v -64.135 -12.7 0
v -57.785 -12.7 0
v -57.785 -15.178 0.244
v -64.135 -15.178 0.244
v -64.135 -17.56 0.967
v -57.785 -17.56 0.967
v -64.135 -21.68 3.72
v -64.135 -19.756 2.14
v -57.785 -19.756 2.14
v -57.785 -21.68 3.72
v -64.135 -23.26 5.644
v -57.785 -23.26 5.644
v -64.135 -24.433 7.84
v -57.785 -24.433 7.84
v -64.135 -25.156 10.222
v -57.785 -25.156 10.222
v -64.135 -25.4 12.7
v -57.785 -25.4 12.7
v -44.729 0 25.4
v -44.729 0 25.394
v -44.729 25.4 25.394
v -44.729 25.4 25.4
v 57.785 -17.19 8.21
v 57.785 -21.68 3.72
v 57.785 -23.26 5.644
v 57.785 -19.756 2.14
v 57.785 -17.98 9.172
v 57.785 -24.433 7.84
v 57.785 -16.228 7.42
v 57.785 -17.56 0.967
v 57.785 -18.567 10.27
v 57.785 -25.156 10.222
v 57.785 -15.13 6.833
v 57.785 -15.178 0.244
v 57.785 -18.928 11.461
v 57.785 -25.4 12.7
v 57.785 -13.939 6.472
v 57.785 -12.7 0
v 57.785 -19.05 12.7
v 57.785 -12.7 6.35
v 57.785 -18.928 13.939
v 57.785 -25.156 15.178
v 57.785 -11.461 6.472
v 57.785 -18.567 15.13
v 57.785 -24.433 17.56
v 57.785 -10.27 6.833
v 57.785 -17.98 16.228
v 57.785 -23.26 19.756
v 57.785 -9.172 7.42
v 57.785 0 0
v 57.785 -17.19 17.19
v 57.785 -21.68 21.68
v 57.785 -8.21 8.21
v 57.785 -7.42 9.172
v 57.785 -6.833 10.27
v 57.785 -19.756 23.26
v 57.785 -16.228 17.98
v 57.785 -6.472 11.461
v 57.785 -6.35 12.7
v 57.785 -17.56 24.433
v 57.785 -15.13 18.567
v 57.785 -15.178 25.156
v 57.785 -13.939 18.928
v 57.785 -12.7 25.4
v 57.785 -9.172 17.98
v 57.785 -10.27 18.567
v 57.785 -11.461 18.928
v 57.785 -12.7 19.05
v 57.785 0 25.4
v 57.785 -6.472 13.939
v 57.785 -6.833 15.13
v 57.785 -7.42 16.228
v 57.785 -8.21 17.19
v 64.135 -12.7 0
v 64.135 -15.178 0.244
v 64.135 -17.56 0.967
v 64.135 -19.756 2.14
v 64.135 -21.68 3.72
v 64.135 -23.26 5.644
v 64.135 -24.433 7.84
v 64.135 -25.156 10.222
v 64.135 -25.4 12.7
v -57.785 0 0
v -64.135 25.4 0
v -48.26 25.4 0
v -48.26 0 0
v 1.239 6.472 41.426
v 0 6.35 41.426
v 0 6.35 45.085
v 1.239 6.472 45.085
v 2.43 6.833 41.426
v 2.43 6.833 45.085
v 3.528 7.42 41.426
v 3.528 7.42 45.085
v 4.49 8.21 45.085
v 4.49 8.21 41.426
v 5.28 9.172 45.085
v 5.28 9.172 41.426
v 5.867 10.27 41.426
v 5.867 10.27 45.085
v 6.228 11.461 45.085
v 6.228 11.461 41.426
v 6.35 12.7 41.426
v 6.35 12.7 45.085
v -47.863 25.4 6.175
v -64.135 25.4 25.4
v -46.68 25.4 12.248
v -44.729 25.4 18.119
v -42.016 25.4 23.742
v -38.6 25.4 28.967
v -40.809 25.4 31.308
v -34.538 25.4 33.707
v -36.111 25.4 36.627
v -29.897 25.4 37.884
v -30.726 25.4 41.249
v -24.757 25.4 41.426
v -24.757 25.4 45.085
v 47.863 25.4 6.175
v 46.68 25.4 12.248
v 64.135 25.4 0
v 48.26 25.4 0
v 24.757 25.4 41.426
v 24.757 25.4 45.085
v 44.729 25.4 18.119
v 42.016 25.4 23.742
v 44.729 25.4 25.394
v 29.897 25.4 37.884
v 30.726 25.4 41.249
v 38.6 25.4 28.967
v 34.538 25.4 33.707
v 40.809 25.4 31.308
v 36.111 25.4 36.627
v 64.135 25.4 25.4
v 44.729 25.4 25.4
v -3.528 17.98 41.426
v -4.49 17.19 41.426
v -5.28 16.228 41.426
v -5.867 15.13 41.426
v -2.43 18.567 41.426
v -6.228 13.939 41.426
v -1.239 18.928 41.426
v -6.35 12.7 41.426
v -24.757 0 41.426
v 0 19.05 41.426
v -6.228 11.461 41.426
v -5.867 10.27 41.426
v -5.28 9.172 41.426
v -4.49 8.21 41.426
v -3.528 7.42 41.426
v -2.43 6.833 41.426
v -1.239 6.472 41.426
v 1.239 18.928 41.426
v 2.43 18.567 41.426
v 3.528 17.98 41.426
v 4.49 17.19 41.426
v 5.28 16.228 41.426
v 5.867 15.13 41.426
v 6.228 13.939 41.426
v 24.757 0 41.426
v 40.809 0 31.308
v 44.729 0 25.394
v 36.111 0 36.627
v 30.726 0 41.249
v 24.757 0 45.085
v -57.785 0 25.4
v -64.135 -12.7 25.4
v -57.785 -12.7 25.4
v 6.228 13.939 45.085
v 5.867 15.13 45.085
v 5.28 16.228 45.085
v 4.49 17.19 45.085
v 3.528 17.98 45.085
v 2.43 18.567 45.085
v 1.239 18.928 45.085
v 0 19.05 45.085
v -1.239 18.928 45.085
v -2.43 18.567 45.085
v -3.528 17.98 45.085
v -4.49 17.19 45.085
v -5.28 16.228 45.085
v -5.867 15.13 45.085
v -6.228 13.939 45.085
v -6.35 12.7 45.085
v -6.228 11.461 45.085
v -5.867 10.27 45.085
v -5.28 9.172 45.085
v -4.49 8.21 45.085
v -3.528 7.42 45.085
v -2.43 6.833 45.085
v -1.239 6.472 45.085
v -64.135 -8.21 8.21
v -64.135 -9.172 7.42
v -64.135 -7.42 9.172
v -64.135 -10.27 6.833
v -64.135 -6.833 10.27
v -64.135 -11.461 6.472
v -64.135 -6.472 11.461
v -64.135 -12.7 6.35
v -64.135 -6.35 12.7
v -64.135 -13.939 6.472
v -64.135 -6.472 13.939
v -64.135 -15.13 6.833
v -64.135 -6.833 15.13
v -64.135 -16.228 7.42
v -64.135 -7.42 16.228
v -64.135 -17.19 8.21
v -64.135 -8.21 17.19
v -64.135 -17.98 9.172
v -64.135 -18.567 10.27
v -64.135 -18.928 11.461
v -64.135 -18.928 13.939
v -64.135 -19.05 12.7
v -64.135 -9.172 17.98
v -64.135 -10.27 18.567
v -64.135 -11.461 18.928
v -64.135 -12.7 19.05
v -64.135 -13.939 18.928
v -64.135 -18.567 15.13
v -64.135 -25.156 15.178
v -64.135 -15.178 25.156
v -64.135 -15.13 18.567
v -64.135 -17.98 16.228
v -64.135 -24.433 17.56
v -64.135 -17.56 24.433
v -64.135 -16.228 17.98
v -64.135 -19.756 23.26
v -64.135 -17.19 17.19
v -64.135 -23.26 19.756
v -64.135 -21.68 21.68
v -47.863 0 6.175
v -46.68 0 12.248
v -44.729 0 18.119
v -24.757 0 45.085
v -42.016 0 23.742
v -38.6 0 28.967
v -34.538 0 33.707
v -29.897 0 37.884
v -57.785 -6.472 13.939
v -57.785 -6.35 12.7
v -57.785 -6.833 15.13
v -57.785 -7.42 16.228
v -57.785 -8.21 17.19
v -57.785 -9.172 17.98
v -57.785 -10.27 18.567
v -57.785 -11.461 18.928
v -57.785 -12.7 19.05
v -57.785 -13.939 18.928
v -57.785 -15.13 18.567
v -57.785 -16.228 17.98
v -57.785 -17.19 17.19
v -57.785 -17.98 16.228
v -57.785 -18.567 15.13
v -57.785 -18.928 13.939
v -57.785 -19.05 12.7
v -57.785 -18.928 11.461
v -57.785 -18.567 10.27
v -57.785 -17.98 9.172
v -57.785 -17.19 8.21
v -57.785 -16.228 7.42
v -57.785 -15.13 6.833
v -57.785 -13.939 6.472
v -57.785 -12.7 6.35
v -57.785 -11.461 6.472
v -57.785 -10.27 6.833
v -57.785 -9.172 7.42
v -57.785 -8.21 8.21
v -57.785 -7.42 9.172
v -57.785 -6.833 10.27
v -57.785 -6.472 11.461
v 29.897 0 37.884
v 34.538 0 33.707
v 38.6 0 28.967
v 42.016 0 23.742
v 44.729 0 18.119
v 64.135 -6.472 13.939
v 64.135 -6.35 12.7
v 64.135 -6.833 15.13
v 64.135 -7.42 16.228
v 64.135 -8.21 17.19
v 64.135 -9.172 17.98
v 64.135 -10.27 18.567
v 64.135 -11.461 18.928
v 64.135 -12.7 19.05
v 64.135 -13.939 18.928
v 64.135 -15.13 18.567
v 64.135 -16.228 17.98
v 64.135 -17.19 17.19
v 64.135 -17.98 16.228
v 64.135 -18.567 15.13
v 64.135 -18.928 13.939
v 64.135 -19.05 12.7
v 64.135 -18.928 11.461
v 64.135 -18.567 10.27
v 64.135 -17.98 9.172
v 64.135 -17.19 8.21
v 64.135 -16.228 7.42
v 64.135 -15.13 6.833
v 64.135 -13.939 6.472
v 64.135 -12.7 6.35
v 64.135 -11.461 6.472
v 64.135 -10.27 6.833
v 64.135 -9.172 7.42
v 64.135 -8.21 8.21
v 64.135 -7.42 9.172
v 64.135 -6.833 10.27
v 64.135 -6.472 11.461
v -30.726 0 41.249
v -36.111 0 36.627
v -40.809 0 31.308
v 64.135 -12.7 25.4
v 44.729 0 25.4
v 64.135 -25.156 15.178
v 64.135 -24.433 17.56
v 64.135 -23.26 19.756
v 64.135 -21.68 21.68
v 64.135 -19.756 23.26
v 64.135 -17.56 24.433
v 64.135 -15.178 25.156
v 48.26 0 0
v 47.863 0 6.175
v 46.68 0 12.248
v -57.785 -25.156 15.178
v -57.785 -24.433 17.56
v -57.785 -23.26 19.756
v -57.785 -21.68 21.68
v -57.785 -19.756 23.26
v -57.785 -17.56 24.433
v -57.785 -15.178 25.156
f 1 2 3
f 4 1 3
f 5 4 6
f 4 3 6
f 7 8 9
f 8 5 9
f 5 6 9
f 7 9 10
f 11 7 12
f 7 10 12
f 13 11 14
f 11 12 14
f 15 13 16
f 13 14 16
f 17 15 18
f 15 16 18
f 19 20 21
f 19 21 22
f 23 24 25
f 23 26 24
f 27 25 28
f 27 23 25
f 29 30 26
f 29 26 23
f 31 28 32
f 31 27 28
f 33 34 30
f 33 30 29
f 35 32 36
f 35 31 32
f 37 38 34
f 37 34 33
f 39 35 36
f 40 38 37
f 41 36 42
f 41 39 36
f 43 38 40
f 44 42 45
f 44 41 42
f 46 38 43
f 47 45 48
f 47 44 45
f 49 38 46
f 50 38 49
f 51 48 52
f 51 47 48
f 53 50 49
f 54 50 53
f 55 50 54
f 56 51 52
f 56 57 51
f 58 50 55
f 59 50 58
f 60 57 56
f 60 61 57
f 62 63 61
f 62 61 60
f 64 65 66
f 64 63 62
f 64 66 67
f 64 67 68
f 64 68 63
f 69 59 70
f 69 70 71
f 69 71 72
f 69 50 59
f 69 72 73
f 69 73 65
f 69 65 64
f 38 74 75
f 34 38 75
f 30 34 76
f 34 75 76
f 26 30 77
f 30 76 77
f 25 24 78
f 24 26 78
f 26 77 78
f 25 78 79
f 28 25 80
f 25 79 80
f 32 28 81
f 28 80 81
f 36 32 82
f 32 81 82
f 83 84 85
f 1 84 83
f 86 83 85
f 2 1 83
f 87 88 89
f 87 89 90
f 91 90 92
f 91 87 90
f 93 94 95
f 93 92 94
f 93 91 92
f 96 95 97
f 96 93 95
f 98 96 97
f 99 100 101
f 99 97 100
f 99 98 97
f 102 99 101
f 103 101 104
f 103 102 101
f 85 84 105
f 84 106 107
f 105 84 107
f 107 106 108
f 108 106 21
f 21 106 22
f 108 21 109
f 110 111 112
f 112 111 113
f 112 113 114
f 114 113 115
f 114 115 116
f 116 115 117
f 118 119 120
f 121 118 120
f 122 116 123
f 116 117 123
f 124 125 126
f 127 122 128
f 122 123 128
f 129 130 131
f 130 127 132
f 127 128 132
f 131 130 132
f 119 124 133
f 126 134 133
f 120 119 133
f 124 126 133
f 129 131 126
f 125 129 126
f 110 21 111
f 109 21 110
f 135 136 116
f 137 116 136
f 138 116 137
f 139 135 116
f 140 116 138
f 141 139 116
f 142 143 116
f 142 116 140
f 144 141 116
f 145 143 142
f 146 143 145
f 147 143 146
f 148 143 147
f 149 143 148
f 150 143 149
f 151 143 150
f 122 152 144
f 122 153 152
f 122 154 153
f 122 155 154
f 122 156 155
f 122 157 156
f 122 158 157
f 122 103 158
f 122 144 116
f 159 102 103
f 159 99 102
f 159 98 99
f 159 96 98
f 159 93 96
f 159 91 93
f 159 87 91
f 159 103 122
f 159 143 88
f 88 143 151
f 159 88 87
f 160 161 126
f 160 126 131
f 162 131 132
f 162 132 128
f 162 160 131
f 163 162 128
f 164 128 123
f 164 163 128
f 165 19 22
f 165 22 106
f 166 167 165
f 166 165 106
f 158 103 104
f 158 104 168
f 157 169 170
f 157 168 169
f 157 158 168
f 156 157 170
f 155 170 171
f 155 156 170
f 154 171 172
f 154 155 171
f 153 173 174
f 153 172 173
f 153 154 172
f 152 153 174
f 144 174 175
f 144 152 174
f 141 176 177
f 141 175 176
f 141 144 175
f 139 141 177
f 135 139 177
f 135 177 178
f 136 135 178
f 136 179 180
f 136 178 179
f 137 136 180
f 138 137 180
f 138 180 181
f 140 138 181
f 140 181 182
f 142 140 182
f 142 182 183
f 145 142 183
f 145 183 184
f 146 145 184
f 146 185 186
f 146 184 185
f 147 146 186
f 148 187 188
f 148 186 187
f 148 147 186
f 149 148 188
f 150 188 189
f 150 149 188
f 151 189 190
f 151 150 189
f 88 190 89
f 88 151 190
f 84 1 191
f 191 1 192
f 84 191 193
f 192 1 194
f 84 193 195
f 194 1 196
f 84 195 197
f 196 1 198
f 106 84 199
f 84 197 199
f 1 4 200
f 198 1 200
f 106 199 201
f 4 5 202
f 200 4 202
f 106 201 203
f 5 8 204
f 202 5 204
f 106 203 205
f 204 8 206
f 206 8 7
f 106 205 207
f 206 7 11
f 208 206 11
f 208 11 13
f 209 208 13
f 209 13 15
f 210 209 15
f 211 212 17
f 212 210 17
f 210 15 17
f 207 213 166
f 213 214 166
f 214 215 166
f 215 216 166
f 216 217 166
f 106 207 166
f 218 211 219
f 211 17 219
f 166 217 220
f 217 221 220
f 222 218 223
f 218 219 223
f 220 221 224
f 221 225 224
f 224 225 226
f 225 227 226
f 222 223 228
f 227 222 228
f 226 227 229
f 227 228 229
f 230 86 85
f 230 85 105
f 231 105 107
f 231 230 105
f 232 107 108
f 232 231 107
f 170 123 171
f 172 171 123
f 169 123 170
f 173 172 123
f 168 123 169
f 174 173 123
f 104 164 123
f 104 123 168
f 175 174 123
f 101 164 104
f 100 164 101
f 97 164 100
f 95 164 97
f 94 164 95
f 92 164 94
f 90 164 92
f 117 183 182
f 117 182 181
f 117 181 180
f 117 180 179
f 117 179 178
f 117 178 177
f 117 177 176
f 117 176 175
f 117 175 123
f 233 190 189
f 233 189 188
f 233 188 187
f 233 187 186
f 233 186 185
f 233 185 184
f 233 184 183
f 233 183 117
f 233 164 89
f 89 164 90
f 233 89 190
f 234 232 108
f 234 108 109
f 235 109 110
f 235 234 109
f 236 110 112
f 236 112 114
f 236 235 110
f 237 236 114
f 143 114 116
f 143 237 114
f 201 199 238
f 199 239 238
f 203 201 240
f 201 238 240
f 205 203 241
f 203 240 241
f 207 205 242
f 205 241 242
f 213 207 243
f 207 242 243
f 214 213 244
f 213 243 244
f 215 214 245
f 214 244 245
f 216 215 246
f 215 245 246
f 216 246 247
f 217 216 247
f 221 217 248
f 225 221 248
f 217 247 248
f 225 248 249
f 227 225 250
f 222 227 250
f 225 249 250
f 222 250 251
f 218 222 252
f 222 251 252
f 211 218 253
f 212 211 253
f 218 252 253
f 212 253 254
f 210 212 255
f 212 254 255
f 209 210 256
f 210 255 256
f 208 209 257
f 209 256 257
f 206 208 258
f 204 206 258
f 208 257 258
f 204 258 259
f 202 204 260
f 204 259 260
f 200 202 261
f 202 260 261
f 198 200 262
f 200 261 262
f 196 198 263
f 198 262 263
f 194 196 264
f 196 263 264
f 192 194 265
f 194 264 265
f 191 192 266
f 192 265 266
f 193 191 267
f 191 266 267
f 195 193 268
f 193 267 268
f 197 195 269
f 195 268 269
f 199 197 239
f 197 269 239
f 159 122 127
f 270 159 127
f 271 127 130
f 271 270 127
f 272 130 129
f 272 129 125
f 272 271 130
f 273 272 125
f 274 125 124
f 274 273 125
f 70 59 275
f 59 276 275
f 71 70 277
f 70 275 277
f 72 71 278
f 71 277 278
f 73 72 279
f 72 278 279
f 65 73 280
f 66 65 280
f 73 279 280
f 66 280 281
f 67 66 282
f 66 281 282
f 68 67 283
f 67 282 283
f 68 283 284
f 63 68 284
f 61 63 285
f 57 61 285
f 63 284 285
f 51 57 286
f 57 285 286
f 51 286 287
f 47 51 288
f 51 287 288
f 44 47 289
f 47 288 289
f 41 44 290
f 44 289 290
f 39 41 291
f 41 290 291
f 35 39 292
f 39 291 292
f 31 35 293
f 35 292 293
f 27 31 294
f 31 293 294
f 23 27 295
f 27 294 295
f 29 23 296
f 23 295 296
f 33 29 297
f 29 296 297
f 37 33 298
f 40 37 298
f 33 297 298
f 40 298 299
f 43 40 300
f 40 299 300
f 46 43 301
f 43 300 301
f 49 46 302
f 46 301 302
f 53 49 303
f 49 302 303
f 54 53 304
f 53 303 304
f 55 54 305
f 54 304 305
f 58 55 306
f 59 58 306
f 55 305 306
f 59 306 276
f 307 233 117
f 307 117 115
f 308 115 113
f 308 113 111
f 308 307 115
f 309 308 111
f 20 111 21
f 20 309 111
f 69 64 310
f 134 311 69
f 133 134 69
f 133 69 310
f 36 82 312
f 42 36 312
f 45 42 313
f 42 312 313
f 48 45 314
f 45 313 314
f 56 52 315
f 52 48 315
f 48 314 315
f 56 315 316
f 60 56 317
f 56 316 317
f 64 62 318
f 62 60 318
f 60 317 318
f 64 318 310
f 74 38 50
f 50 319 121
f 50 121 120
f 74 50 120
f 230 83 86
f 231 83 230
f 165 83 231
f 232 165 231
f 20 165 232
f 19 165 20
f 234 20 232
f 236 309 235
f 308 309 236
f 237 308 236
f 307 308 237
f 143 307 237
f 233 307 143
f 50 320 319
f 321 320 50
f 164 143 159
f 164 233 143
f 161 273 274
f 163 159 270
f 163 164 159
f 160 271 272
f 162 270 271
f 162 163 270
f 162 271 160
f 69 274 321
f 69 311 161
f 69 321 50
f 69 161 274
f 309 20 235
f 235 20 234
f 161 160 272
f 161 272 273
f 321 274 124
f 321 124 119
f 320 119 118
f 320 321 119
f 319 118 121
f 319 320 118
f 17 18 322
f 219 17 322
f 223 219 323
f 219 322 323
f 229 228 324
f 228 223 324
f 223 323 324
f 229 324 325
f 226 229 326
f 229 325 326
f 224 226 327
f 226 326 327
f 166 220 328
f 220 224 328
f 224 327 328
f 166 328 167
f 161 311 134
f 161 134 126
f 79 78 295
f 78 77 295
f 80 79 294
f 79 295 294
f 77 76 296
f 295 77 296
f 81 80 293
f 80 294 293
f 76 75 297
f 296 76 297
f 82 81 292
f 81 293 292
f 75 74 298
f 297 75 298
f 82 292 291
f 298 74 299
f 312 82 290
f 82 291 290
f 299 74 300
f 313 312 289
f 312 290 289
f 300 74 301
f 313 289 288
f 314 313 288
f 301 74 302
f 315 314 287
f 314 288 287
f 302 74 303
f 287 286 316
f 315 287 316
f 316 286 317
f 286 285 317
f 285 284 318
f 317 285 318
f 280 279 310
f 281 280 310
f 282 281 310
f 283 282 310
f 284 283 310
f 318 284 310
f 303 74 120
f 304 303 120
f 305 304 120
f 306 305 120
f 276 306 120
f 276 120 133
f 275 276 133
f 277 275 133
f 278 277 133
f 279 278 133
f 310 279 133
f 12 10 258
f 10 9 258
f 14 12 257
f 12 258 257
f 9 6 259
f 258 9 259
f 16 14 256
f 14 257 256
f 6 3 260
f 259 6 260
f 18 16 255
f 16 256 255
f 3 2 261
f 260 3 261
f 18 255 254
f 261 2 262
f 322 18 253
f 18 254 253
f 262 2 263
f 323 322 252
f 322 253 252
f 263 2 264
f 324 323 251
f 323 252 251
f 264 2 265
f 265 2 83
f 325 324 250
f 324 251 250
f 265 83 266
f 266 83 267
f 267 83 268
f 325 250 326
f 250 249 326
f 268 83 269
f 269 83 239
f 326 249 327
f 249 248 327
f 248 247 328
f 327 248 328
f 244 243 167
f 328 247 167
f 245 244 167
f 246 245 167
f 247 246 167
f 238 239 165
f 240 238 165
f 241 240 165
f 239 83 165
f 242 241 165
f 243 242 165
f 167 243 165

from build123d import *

# Parameters (mm, degrees)
F0_W     = 6.35
F0_H     = 25.4
F1_DEPTH = 25.4
F2_DEPTH = 25.4
F3_R     = 6.35
F4_DEPTH = 76.2
F7_DEPTH = 76.2


with BuildPart() as f1:
    # F0 (on Front) → F1 (new body)
    with BuildSketch(Plane.XZ):
        with BuildLine():
            Line((-44.7294, 18.1192818743), (-44.7294, 25.3937000187))
            ThreePointArc((-44.7294, 25.3937000187), (-49.7303524721, 13.13207021), (-51.435, 0))
            Line((-51.435, 0), (-48.26, 0))
            ThreePointArc((-48.26, 0), (-47.3691273088, 9.2300258938), (-44.7294, 18.1192818743))
        make_face()
        with BuildLine():
            ThreePointArc((-51.435, 0), (-49.7303524721, 13.13207021), (-44.7294, 25.3937000187))
            Line((-44.7294, 25.3937000187), (-44.7294, 25.4))
            Line((-44.7294, 25.4), (-51.435, 25.4))
            Line((-51.435, 25.4), (-51.435, 0))
        make_face()
        with Locations((-54.61, 12.7)):
            Rectangle(F0_W, F0_H)
        with Locations((-60.96, 12.7)):
            Rectangle(F0_W, F0_H)
        with BuildLine():
            ThreePointArc((44.7294, 25.3937000187), (36.1112423463, 36.6270037159), (24.7568576358, 45.085))
            Line((24.7568576358, 45.085), (24.7568576358, 41.426146333))
            ThreePointArc((24.7568576358, 41.426146333), (36.6454292209, 31.4028679776), (44.7294, 18.1192818743))
            Line((44.7294, 18.1192818743), (44.7294, 25.3937000187))
        make_face()
        with BuildLine():
            ThreePointArc((51.435, 0), (49.7303524721, 13.13207021), (44.7294, 25.3937000187))
            Line((44.7294, 25.3937000187), (44.7294, 18.1192818743))
            ThreePointArc((44.7294, 18.1192818743), (47.3691273088, 9.2300258938), (48.26, 0))
            Line((48.26, 0), (51.435, 0))
        make_face()
        with BuildLine():
            Line((44.7294, 25.4), (44.7294, 25.3937000187))
            ThreePointArc((44.7294, 25.3937000187), (49.7303524721, 13.13207021), (51.435, 0))
            Line((51.435, 0), (51.435, 25.4))
            Line((51.435, 25.4), (44.7294, 25.4))
        make_face()
        with Locations((54.61, 12.7)):
            Rectangle(F0_W, F0_H)
        with Locations((60.96, 12.7)):
            Rectangle(F0_W, F0_H)
        with BuildLine():
            Line((-24.7568576358, 41.426146333), (-24.7568576358, 45.085))
            ThreePointArc((-24.7568576358, 45.085), (-36.1112423463, 36.6270037159), (-44.7294, 25.3937000187))
            Line((-44.7294, 25.3937000187), (-44.7294, 18.1192818743))
            ThreePointArc((-44.7294, 18.1192818743), (-36.6454292209, 31.4028679776), (-24.7568576358, 41.426146333))
        make_face()
        with BuildLine():
            ThreePointArc((24.7568576358, 41.426146333), (21.0657218153, 43.419614973), (17.2154109739, 45.085))
            Line((17.2154109739, 45.085), (0, 45.085))
            Line((0, 45.085), (-17.2154109739, 45.085))
            ThreePointArc((-17.2154109739, 45.085), (-21.0657218153, 43.419614973), (-24.7568576358, 41.426146333))
            Line((-24.7568576358, 41.426146333), (24.7568576358, 41.426146333))
        make_face()
        with BuildLine():
            Line((-17.2154109739, 45.085), (-24.7568576358, 45.085))
            Line((-24.7568576358, 45.085), (-24.7568576358, 41.426146333))
            ThreePointArc((-24.7568576358, 41.426146333), (-21.0657218153, 43.419614973), (-17.2154109739, 45.085))
        make_face()
        with BuildLine():
            Line((24.7568576358, 41.426146333), (24.7568576358, 45.085))
            Line((24.7568576358, 45.085), (17.2154109739, 45.085))
            ThreePointArc((17.2154109739, 45.085), (21.0657218153, 43.419614973), (24.7568576358, 41.426146333))
        make_face()
    extrude(amount=-F1_DEPTH)

    # F0 (on Front) → F2 (join)
    with BuildSketch(Plane.XZ):
        with Locations((60.96, 12.7)):
            Rectangle(F0_W, F0_H)
        with Locations((-60.96, 12.7)):
            Rectangle(F0_W, F0_H)
    extrude(amount=F2_DEPTH)


with BuildPart() as f4:
    # F3 (on Right) → F4 (new body, symmetric)
    with BuildSketch(Plane.YZ):
        with Locations((-12.7, 12.7)):
            Circle(F3_R)
    extrude(amount=F4_DEPTH, both=True)


with BuildPart() as f4b:
    # F3 (on Right) → F4, piece 2 (new body, symmetric)
    with BuildSketch(Plane.YZ):
        with BuildLine():
            ThreePointArc((-25.4, 12.7), (-21.6802561211, 21.6802561211), (-12.7, 25.4))
            Line((-12.7, 25.4), (-25.4, 25.4))
            Line((-25.4, 25.4), (-25.4, 12.7))
        make_face()
    extrude(amount=F4_DEPTH, both=True)


with BuildPart() as f4c:
    # F3 (on Right) → F4, piece 3 (new body, symmetric)
    with BuildSketch(Plane.YZ):
        with BuildLine():
            Line((-25.4, 0), (-12.7, 0))
            ThreePointArc((-12.7, 0), (-21.6802561211, 3.7197438789), (-25.4, 12.7))
            Line((-25.4, 12.7), (-25.4, 0))
        make_face()
    extrude(amount=F4_DEPTH, both=True)


with BuildPart() as f1_1:
    add(f1.part)

    # F5: cut F4b, F4, F4c
    add(f4b.part, mode=Mode.SUBTRACT)
    add(f4.part, mode=Mode.SUBTRACT)
    add(f4c.part, mode=Mode.SUBTRACT)


with BuildPart() as f7:
    # F6 (on Top) → F7 (new body)
    with BuildSketch(Plane.XY):
        with BuildLine():
            ThreePointArc((0, 6.35), (4.4901280605, 8.2098719395), (6.35, 12.7))
            ThreePointArc((6.35, 12.7), (-4.4901280605, 17.1901280605), (0, 6.35))
        make_face()
    extrude(amount=F7_DEPTH)


with BuildPart() as f1_2:
    add(f1_1.part)

    # F8: cut F7
    add(f7.part, mode=Mode.SUBTRACT)


solid = f1_2.part
